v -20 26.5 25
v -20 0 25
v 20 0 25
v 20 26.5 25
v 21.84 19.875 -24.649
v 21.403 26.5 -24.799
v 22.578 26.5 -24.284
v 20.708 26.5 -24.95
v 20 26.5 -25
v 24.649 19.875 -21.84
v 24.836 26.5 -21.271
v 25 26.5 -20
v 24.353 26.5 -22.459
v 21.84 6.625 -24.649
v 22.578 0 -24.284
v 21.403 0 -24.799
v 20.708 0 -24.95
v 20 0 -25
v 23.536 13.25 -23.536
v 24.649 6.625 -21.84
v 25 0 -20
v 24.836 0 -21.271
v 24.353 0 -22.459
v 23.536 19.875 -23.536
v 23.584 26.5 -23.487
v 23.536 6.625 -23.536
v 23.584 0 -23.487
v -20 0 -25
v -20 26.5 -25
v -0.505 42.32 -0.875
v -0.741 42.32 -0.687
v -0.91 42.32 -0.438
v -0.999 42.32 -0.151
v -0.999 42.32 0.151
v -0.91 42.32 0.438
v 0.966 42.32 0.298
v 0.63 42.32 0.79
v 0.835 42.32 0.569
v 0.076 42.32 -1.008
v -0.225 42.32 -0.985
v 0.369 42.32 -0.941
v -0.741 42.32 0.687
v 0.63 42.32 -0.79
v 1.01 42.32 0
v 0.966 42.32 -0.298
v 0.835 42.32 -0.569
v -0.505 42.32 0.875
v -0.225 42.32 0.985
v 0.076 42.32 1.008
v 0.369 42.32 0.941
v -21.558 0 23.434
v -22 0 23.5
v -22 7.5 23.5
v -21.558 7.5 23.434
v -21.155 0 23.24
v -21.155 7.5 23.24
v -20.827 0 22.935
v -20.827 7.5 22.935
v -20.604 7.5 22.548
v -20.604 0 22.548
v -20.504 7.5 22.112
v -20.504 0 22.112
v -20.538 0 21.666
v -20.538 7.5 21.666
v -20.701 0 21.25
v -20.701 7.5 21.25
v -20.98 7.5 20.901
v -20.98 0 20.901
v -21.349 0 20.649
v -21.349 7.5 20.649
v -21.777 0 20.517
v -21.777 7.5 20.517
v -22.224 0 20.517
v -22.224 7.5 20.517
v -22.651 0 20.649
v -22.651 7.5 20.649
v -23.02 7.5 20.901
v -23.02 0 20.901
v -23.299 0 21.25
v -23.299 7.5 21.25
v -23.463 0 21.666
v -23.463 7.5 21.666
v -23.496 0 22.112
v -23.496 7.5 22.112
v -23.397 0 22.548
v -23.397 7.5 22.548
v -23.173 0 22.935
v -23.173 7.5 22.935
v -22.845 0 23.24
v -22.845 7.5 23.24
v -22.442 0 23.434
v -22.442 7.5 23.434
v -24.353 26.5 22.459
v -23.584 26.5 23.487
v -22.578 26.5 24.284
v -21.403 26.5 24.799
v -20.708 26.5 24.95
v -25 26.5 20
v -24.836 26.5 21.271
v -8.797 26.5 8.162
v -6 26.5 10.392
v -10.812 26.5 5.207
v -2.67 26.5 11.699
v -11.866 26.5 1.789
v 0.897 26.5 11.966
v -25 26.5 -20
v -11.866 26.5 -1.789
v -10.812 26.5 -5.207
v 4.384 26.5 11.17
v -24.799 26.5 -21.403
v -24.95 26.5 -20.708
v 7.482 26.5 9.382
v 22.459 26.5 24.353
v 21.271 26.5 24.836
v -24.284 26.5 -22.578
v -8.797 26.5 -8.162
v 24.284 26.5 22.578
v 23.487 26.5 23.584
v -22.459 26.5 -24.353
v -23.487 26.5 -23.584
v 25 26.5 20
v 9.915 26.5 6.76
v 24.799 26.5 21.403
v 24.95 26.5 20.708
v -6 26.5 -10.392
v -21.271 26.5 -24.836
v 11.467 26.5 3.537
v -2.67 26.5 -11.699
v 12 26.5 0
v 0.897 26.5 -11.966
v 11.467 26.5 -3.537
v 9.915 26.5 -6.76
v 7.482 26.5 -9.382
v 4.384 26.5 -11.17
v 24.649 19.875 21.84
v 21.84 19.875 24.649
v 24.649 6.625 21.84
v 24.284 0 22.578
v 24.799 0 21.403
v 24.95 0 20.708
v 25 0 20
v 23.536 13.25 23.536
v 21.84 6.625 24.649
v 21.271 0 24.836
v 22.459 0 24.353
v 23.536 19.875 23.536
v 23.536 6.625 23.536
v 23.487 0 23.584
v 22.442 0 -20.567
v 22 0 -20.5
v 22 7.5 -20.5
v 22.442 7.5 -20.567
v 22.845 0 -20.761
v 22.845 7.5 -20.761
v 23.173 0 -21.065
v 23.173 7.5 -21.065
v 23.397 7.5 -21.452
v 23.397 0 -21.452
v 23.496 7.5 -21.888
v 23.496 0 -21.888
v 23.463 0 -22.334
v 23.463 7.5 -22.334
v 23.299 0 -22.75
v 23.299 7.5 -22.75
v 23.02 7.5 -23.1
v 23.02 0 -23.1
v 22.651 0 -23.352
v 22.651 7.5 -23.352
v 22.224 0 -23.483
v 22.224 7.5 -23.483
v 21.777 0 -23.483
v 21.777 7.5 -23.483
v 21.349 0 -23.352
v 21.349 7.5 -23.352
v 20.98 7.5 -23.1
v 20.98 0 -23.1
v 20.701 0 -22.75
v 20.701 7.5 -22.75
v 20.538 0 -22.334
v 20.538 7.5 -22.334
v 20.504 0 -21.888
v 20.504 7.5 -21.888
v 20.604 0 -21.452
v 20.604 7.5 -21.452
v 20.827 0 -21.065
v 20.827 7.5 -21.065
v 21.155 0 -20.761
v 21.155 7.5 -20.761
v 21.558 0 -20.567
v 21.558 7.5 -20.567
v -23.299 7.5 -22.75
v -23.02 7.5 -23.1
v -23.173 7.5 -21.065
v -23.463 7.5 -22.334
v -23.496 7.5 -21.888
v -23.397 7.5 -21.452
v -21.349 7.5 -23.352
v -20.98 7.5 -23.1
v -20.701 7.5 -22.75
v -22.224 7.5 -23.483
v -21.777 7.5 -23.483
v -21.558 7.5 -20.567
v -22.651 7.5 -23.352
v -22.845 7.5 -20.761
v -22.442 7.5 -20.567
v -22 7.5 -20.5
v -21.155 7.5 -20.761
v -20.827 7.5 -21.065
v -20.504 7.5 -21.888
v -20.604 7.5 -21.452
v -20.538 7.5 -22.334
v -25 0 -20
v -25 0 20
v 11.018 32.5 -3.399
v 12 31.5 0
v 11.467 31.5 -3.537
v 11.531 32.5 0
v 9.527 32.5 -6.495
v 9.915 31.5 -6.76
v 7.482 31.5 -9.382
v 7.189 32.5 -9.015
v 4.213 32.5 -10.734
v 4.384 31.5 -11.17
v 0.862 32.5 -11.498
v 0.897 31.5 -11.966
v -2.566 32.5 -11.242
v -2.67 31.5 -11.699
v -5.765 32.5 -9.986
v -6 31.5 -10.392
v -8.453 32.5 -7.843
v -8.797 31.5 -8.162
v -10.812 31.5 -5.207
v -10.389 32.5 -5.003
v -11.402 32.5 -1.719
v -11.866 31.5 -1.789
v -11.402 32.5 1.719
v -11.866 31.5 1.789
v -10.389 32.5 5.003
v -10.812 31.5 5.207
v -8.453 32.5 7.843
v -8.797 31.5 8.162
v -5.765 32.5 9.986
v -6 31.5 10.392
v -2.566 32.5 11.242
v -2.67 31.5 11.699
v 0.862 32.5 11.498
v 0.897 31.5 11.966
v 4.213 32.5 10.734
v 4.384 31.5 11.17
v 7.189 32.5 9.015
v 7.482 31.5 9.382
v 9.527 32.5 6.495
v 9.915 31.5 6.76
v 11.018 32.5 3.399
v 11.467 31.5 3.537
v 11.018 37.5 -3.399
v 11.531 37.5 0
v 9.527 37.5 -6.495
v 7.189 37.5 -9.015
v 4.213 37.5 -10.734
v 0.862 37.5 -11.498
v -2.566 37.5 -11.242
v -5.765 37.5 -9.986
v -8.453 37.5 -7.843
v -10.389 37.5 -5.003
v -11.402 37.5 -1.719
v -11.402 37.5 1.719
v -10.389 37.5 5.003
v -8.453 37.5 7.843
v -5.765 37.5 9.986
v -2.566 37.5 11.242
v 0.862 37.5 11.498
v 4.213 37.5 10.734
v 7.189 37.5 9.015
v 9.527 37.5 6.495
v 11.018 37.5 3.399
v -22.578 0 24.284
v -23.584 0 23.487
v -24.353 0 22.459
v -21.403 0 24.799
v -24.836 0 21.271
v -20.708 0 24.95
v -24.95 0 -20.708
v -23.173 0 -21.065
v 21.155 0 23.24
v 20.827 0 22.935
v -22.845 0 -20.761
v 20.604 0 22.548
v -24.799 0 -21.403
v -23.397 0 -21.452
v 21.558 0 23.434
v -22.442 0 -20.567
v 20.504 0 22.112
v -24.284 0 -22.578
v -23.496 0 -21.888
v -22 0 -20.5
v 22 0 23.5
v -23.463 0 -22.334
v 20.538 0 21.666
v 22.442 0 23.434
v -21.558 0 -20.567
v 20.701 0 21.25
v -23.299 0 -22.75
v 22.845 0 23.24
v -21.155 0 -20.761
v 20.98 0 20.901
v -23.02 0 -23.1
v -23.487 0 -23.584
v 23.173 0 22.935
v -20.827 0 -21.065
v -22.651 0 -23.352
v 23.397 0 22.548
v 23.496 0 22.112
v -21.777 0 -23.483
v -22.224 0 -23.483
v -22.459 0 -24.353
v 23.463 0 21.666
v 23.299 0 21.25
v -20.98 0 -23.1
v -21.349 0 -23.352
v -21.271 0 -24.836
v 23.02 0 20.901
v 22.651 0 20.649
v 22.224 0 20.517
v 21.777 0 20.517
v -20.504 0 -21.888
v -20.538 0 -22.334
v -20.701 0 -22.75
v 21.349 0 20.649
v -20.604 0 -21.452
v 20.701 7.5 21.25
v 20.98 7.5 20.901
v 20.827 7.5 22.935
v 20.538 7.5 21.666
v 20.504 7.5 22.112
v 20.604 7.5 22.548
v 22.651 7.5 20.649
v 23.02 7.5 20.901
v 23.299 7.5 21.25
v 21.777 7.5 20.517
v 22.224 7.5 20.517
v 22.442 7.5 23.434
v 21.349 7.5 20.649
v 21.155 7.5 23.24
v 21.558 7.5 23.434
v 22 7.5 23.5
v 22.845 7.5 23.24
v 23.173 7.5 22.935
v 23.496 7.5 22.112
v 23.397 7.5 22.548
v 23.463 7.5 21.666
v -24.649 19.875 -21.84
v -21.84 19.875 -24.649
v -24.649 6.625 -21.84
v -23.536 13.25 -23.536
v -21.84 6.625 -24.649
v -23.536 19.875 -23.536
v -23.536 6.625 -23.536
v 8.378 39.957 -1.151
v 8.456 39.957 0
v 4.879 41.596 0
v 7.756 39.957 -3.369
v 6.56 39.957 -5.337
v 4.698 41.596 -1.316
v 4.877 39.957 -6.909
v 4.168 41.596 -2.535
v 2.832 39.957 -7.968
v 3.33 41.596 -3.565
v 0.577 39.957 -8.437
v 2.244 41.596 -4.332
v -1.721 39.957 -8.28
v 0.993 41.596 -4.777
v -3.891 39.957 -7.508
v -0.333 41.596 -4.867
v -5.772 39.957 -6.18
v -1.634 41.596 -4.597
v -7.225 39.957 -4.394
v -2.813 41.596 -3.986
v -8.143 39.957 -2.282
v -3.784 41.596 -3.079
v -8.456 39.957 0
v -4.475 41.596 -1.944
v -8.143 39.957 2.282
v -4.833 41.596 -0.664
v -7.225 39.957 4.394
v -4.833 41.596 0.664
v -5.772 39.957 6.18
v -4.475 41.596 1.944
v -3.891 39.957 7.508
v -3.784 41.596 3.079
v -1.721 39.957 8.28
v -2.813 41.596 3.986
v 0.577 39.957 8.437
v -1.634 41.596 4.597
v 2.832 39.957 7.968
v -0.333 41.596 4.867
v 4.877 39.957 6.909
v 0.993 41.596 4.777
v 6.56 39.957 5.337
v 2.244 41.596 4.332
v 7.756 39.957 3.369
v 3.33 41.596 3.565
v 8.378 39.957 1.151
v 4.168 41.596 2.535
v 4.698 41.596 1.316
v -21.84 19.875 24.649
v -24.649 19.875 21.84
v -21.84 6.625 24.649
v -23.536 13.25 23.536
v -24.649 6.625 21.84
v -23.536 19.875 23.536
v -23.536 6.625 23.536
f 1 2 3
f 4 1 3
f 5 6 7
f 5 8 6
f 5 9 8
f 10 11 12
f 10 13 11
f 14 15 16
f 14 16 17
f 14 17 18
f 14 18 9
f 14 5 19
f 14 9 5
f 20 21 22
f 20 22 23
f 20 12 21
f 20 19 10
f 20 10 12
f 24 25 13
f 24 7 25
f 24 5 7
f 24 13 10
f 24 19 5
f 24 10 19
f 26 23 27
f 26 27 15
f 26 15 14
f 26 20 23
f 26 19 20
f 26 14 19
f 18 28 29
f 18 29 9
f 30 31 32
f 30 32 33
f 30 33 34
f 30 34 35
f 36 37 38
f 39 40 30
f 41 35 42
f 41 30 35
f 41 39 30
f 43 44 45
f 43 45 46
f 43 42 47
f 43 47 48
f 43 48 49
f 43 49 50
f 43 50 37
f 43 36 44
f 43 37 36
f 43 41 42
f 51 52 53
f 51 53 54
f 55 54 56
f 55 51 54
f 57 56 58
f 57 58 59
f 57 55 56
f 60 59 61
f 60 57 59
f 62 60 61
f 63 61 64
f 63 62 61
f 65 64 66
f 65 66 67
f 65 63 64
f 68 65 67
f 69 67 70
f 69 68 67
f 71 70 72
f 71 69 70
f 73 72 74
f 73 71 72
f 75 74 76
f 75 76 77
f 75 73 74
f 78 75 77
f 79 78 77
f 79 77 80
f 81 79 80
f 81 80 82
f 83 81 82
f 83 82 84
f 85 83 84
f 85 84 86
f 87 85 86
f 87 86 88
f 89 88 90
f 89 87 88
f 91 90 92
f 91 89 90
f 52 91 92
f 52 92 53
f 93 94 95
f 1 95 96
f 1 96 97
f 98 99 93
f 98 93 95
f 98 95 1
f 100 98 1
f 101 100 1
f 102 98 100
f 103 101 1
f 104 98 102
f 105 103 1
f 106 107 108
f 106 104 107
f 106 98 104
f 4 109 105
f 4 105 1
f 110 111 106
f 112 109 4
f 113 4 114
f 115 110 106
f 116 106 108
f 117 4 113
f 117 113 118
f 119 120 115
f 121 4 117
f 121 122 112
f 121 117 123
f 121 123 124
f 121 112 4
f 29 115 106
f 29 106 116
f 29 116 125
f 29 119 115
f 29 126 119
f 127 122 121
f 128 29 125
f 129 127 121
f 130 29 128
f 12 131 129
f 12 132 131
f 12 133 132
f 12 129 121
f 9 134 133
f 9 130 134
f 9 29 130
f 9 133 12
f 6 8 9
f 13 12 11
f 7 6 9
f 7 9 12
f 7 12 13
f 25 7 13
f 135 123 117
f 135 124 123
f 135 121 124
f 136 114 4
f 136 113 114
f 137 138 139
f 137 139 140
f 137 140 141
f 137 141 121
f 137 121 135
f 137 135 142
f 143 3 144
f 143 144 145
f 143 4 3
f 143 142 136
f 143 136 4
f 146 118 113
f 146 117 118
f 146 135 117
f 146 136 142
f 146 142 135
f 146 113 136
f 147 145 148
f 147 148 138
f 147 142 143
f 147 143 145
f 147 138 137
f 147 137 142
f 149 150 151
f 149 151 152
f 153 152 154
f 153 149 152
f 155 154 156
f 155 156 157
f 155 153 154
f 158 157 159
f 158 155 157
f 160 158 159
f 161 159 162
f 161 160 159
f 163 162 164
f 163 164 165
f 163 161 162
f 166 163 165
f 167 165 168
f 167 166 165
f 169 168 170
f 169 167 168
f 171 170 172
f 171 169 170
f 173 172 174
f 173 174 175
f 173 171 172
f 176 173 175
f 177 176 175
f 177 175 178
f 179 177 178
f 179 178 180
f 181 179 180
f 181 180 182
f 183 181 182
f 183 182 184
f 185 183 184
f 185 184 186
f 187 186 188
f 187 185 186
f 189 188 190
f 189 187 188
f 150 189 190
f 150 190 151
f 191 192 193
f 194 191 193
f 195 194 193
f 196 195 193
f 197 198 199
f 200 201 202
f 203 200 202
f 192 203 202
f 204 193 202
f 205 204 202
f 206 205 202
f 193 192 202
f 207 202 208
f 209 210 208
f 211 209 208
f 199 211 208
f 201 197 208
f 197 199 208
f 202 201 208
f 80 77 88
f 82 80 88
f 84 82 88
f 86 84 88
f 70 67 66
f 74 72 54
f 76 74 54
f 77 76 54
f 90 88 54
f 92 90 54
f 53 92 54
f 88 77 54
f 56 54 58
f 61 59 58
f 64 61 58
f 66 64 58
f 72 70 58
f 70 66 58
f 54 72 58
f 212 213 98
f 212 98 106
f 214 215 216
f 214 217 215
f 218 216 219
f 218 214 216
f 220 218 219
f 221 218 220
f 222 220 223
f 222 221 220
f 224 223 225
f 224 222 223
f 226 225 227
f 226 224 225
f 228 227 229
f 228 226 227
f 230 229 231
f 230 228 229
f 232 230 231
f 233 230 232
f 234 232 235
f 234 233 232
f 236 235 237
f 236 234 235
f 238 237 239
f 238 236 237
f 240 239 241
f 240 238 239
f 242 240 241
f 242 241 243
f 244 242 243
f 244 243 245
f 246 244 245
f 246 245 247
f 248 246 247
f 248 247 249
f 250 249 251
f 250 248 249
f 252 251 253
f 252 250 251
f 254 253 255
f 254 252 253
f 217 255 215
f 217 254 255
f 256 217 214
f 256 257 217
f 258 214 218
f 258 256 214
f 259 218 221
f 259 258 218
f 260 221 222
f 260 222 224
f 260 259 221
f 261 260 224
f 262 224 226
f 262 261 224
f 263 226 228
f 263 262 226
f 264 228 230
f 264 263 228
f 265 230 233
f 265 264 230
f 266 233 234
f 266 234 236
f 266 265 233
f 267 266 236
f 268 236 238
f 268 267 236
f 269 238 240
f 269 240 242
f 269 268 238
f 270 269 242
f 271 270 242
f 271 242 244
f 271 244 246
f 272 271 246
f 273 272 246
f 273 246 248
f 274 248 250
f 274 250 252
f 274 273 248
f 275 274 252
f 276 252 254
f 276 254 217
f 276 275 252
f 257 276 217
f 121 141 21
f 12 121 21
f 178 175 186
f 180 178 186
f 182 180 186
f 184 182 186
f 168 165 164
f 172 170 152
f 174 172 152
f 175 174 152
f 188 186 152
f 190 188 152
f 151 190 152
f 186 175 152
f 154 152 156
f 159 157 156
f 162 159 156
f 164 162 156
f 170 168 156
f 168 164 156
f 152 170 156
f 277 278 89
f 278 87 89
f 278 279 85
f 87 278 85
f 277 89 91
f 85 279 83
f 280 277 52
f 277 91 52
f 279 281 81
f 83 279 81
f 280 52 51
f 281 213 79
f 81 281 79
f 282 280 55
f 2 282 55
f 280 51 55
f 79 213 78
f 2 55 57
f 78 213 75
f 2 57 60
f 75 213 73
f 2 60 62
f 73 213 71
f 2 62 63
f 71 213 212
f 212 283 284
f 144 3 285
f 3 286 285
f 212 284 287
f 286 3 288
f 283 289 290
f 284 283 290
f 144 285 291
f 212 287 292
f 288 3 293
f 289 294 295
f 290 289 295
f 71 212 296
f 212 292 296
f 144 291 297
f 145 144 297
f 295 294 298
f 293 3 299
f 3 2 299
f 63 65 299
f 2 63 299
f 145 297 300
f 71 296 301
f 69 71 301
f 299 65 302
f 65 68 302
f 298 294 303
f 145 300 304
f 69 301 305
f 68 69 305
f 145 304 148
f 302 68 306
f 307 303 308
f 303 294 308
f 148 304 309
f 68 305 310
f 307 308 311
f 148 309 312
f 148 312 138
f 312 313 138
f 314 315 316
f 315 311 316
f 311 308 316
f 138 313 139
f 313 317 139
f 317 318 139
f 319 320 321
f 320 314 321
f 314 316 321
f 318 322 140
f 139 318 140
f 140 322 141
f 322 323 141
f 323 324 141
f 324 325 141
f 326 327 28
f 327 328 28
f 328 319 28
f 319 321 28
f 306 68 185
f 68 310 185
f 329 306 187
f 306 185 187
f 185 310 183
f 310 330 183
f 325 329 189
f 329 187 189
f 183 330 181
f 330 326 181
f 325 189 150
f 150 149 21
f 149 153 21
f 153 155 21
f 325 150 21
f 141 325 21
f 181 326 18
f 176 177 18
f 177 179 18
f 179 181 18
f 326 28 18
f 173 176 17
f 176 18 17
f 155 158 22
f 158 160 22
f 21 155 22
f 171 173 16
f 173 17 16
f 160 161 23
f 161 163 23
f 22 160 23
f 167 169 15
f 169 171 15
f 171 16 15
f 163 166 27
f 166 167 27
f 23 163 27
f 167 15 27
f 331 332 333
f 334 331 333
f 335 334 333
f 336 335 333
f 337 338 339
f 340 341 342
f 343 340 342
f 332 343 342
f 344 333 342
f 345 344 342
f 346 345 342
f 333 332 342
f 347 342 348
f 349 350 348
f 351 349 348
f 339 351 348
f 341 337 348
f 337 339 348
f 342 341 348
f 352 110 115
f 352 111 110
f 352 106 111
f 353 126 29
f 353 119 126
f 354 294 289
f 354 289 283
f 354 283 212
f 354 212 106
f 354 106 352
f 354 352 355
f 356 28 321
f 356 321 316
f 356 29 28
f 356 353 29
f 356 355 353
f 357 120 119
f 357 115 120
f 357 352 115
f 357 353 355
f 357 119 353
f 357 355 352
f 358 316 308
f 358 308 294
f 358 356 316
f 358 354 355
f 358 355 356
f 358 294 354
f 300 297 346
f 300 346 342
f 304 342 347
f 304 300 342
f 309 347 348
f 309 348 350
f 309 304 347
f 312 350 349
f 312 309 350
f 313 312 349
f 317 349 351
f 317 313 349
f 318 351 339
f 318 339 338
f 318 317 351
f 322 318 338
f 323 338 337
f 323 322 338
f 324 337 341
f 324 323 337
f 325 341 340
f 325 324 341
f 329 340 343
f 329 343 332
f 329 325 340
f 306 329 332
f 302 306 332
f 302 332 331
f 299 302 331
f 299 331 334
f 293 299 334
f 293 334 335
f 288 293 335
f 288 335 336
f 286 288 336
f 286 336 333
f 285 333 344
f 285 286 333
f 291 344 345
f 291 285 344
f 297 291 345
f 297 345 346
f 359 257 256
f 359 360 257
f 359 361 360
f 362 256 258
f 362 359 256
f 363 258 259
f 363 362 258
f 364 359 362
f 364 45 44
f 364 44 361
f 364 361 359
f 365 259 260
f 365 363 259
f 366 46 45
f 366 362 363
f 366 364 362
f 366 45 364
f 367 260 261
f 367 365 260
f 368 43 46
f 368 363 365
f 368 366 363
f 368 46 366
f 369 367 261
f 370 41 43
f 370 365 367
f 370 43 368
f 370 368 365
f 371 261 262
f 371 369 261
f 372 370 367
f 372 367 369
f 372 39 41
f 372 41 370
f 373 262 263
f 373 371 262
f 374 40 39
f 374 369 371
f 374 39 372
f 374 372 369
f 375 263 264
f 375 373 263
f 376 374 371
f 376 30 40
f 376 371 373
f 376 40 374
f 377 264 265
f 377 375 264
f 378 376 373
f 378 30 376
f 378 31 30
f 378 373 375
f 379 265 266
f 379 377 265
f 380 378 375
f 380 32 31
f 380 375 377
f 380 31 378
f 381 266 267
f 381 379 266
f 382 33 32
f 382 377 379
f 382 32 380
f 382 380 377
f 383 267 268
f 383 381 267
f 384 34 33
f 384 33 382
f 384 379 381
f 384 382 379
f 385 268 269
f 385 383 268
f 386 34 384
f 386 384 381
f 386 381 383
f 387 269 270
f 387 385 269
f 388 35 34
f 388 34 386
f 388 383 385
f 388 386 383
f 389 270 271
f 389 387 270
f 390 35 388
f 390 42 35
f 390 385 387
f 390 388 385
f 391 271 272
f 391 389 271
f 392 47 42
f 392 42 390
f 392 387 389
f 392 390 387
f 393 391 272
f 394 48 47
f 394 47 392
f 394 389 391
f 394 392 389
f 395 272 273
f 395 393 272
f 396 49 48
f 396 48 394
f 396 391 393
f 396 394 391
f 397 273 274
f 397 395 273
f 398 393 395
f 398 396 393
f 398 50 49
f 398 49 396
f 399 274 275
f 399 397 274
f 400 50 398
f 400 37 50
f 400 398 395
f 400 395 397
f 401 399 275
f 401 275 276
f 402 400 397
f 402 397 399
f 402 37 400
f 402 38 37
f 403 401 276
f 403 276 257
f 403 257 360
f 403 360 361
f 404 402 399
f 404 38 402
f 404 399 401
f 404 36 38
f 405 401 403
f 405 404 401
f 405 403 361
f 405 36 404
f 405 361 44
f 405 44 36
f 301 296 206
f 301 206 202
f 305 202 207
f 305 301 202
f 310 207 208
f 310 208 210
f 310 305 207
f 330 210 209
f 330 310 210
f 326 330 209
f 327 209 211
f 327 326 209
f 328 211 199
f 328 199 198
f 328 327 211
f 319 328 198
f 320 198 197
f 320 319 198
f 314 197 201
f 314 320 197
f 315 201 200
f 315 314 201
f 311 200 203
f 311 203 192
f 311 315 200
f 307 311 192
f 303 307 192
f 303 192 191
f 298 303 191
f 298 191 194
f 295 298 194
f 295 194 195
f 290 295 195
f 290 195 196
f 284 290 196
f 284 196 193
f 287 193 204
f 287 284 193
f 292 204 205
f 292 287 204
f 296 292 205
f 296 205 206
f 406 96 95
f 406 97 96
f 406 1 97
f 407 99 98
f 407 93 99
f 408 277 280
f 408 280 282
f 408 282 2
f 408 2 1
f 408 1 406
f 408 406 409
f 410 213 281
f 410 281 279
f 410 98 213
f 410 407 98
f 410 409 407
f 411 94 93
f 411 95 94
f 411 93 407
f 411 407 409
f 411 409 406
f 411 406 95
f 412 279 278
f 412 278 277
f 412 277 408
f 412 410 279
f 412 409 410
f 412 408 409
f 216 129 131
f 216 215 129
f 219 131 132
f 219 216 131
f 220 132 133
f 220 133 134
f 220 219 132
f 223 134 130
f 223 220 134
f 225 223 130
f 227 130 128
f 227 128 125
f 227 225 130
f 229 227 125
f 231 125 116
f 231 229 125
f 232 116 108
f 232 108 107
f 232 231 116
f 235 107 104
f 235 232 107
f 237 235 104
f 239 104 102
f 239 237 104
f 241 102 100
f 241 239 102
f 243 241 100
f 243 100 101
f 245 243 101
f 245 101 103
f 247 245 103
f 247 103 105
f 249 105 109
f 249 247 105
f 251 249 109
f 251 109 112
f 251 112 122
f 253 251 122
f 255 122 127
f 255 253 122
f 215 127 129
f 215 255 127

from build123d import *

# Parameters (mm, degrees)
SKETCH3_W           = 50
SKETCH3_H           = 50
BOSS_EXTRUDE1_DEPTH = 26.5
SKETCH4_R           = 1.5
CUT_EXTRUDE1_DEPTH  = 7.5
VARFILLET1_START    = -1
VARFILLET1_DEPTH    = 28


with BuildPart() as part:
    # Sketch3 → Boss-Extrude1 (new body)
    with BuildSketch(Plane(origin=(0, 0, 0), x_dir=(1, 0, 0), z_dir=(0, 1, 0))):
        Rectangle(SKETCH3_W, SKETCH3_H)
    extrude(amount=BOSS_EXTRUDE1_DEPTH)

    # Sketch4 → Cut-Extrude1 (cut)
    with BuildSketch(Plane(origin=(0, 0, 0), x_dir=(1, 0, 0), z_dir=(0, 1, 0))):
        with Locations(Location((22.000213283, 22.000213283, 0), (0, 0, 270))):
            Circle(SKETCH4_R)
        with Locations(Location((22.000213283, -22.000213283, 0), (0, 0, 270))):
            Circle(SKETCH4_R)
        with Locations(Location((-22.000213283, -22.000213283, 0), (0, 0, 270))):
            Circle(SKETCH4_R)
        with Locations(Location((-22.000213283, 22.000213283, 0), (0, 0, 270))):
            Circle(SKETCH4_R)
    extrude(amount=CUT_EXTRUDE1_DEPTH, mode=Mode.SUBTRACT)

    # Sketch6 → Revolve1 (revolve)
    with BuildSketch(Plane.XY):
        with BuildLine():
            Line((0, 42.32), (0, 26.5))
            Line((0, 26.5), (12, 26.5))
            Line((12, 26.5), (12, 31.5))
            Line((12, 31.5), (11.530705563, 32.5))
            Line((11.530705563, 32.5), (11.530705563, 37.5))
            ThreePointArc((11.530705563, 37.5), (6.71772817, 40.886032515), (1.010390364, 42.32))
            Line((1.010390364, 42.32), (0, 42.32))
        make_face()
    revolve(axis=Axis((0, 26.5, 0), (0, 1, 0)))

    # VarFillet1: read off the stored shape, not the designer's step
    # VarFillet1 outline → VarFillet1 (cut)
    with BuildSketch(Plane(origin=(0, 0, 0), x_dir=(1, 0, 0), z_dir=(0, 1, 0)).offset(VARFILLET1_START)):
        with BuildLine():
            Line((-25, -25), (-20, -25))
            add(Edge.make_bspline(
                [(-20, -25), (-25, -25), (-25, -20)],
                knots=[0, 0, 0, 1, 1, 1], degree=2, weights=[1, 0.707106781, 1]))
            Line((-25, -20), (-25, -25))
        make_face()
        with BuildLine():
            add(Edge.make_bspline(
                [(25, -20), (25, -25), (20, -25)],
                knots=[0, 0, 0, 1, 1, 1], degree=2, weights=[1, 0.707106781, 1]))
            Line((20, -25), (25, -25))
            Line((25, -25), (25, -20))
        make_face()
        with BuildLine():
            Line((-25, 25), (-25, 20))
            add(Edge.make_bspline(
                [(-25, 20), (-25, 25), (-20, 25)],
                knots=[0, 0, 0, 1, 1, 1], degree=2, weights=[1, 0.707106781, 1]))
            Line((-20, 25), (-25, 25))
        make_face()
        with BuildLine():
            add(Edge.make_bspline(
                [(20, 25), (25, 25), (25, 20)],
                knots=[0, 0, 0, 1, 1, 1], degree=2, weights=[1, 0.707106781, 1]))
            Line((25, 20), (25, 25))
            Line((25, 25), (20, 25))
        make_face()
    extrude(amount=VARFILLET1_DEPTH, mode=Mode.SUBTRACT)


solid = part.part
